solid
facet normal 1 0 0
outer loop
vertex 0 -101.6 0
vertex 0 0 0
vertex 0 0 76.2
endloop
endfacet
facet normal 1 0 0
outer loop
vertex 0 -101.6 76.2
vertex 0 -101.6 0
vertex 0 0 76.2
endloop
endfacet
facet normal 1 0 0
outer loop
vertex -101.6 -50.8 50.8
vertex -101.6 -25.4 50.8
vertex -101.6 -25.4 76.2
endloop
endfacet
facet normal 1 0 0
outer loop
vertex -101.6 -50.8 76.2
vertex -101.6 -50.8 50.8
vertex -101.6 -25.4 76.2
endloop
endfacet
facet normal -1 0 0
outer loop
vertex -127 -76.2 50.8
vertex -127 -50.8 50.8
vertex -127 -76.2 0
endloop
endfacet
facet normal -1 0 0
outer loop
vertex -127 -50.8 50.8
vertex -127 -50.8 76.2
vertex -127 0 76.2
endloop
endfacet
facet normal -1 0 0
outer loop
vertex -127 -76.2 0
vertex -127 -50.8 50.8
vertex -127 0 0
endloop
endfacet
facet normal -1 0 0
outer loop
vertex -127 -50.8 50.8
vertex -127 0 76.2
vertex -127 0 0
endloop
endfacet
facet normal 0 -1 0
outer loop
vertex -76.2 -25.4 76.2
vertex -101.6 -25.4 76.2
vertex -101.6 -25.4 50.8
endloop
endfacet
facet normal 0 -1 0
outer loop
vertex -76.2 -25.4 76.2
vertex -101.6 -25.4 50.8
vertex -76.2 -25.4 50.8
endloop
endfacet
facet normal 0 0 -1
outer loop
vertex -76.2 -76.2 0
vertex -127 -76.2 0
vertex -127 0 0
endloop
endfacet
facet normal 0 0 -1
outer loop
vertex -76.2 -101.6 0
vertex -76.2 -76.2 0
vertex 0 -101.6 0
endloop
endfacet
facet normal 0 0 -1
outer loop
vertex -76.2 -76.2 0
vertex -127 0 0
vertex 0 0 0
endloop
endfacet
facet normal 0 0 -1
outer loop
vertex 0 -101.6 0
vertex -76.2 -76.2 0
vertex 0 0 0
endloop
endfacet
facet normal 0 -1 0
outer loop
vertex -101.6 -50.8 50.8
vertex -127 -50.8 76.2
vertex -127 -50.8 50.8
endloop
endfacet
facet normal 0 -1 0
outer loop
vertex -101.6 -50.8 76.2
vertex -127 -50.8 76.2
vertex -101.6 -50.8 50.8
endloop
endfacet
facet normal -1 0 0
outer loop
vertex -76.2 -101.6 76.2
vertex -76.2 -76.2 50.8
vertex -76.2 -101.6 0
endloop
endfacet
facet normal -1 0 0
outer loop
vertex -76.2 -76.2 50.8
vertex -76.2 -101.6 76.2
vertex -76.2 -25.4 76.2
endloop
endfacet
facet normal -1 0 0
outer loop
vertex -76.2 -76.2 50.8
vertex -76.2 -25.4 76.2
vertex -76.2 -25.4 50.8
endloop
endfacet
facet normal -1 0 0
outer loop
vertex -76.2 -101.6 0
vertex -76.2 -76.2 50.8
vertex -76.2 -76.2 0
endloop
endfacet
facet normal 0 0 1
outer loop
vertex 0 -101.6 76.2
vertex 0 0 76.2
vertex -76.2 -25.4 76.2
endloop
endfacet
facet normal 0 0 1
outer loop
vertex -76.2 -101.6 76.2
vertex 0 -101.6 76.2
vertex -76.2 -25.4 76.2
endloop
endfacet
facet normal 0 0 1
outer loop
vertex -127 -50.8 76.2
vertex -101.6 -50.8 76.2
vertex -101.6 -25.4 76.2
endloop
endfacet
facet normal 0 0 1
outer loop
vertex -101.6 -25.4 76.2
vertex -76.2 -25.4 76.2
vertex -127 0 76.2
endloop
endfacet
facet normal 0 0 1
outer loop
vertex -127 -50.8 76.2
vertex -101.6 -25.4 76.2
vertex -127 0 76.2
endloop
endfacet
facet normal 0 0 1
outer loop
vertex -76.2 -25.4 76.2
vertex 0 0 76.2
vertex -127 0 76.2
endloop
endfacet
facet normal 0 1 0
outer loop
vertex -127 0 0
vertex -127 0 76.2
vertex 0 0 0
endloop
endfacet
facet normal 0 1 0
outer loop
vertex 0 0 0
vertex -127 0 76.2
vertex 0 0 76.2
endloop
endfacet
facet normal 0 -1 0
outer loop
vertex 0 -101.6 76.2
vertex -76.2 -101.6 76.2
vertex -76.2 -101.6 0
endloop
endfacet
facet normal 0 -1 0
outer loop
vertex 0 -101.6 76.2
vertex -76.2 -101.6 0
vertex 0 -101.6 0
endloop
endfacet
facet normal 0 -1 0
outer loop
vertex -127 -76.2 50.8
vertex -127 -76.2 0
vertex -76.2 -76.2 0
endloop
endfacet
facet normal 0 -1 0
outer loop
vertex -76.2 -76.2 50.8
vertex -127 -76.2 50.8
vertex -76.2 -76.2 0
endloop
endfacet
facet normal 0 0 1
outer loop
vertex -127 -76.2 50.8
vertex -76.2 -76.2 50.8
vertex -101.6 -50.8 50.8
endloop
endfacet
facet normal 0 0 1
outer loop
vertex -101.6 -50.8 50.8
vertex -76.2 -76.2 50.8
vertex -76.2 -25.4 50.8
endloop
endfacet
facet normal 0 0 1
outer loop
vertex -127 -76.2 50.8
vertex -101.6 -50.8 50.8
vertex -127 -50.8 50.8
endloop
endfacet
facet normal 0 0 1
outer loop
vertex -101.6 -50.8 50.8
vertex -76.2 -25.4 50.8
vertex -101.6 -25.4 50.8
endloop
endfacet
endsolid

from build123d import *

# Parameters (mm, degrees)
F0_W     = 25.4
F0_H     = 25.4
F1_DEPTH = 25.4
F2_DEPTH = 50.8
F3_DEPTH = 76.2
F4_DEPTH = 101.6


with BuildPart() as f1:
    # F0 (on Front) → F1 (new body)
    with BuildSketch(Plane.XZ):
        with Locations((-88.9, 63.5)):
            Rectangle(F0_W, F0_H)
    extrude(amount=F1_DEPTH)

    # F0 (on Front) → F2 (join)
    with BuildSketch(Plane.XZ):
        with Locations((-114.3, 63.5)):
            Rectangle(F0_W, F0_H)
    extrude(amount=F2_DEPTH)

    # F0 (on Front) → F3 (join)
    with BuildSketch(Plane.XZ):
        Polygon((-101.6, 50.8), (-127, 50.8), (-127, 0), (-76.2, 0), (-76.2, 50.8), align=None)
    extrude(amount=F3_DEPTH)

    # F0 (on Front) → F4 (join)
    with BuildSketch(Plane.XZ):
        Polygon((0, 76.2), (-76.2, 76.2), (-76.2, 50.8), (-76.2, 0), (0, 0), align=None)
    extrude(amount=F4_DEPTH)


solid = f1.part
